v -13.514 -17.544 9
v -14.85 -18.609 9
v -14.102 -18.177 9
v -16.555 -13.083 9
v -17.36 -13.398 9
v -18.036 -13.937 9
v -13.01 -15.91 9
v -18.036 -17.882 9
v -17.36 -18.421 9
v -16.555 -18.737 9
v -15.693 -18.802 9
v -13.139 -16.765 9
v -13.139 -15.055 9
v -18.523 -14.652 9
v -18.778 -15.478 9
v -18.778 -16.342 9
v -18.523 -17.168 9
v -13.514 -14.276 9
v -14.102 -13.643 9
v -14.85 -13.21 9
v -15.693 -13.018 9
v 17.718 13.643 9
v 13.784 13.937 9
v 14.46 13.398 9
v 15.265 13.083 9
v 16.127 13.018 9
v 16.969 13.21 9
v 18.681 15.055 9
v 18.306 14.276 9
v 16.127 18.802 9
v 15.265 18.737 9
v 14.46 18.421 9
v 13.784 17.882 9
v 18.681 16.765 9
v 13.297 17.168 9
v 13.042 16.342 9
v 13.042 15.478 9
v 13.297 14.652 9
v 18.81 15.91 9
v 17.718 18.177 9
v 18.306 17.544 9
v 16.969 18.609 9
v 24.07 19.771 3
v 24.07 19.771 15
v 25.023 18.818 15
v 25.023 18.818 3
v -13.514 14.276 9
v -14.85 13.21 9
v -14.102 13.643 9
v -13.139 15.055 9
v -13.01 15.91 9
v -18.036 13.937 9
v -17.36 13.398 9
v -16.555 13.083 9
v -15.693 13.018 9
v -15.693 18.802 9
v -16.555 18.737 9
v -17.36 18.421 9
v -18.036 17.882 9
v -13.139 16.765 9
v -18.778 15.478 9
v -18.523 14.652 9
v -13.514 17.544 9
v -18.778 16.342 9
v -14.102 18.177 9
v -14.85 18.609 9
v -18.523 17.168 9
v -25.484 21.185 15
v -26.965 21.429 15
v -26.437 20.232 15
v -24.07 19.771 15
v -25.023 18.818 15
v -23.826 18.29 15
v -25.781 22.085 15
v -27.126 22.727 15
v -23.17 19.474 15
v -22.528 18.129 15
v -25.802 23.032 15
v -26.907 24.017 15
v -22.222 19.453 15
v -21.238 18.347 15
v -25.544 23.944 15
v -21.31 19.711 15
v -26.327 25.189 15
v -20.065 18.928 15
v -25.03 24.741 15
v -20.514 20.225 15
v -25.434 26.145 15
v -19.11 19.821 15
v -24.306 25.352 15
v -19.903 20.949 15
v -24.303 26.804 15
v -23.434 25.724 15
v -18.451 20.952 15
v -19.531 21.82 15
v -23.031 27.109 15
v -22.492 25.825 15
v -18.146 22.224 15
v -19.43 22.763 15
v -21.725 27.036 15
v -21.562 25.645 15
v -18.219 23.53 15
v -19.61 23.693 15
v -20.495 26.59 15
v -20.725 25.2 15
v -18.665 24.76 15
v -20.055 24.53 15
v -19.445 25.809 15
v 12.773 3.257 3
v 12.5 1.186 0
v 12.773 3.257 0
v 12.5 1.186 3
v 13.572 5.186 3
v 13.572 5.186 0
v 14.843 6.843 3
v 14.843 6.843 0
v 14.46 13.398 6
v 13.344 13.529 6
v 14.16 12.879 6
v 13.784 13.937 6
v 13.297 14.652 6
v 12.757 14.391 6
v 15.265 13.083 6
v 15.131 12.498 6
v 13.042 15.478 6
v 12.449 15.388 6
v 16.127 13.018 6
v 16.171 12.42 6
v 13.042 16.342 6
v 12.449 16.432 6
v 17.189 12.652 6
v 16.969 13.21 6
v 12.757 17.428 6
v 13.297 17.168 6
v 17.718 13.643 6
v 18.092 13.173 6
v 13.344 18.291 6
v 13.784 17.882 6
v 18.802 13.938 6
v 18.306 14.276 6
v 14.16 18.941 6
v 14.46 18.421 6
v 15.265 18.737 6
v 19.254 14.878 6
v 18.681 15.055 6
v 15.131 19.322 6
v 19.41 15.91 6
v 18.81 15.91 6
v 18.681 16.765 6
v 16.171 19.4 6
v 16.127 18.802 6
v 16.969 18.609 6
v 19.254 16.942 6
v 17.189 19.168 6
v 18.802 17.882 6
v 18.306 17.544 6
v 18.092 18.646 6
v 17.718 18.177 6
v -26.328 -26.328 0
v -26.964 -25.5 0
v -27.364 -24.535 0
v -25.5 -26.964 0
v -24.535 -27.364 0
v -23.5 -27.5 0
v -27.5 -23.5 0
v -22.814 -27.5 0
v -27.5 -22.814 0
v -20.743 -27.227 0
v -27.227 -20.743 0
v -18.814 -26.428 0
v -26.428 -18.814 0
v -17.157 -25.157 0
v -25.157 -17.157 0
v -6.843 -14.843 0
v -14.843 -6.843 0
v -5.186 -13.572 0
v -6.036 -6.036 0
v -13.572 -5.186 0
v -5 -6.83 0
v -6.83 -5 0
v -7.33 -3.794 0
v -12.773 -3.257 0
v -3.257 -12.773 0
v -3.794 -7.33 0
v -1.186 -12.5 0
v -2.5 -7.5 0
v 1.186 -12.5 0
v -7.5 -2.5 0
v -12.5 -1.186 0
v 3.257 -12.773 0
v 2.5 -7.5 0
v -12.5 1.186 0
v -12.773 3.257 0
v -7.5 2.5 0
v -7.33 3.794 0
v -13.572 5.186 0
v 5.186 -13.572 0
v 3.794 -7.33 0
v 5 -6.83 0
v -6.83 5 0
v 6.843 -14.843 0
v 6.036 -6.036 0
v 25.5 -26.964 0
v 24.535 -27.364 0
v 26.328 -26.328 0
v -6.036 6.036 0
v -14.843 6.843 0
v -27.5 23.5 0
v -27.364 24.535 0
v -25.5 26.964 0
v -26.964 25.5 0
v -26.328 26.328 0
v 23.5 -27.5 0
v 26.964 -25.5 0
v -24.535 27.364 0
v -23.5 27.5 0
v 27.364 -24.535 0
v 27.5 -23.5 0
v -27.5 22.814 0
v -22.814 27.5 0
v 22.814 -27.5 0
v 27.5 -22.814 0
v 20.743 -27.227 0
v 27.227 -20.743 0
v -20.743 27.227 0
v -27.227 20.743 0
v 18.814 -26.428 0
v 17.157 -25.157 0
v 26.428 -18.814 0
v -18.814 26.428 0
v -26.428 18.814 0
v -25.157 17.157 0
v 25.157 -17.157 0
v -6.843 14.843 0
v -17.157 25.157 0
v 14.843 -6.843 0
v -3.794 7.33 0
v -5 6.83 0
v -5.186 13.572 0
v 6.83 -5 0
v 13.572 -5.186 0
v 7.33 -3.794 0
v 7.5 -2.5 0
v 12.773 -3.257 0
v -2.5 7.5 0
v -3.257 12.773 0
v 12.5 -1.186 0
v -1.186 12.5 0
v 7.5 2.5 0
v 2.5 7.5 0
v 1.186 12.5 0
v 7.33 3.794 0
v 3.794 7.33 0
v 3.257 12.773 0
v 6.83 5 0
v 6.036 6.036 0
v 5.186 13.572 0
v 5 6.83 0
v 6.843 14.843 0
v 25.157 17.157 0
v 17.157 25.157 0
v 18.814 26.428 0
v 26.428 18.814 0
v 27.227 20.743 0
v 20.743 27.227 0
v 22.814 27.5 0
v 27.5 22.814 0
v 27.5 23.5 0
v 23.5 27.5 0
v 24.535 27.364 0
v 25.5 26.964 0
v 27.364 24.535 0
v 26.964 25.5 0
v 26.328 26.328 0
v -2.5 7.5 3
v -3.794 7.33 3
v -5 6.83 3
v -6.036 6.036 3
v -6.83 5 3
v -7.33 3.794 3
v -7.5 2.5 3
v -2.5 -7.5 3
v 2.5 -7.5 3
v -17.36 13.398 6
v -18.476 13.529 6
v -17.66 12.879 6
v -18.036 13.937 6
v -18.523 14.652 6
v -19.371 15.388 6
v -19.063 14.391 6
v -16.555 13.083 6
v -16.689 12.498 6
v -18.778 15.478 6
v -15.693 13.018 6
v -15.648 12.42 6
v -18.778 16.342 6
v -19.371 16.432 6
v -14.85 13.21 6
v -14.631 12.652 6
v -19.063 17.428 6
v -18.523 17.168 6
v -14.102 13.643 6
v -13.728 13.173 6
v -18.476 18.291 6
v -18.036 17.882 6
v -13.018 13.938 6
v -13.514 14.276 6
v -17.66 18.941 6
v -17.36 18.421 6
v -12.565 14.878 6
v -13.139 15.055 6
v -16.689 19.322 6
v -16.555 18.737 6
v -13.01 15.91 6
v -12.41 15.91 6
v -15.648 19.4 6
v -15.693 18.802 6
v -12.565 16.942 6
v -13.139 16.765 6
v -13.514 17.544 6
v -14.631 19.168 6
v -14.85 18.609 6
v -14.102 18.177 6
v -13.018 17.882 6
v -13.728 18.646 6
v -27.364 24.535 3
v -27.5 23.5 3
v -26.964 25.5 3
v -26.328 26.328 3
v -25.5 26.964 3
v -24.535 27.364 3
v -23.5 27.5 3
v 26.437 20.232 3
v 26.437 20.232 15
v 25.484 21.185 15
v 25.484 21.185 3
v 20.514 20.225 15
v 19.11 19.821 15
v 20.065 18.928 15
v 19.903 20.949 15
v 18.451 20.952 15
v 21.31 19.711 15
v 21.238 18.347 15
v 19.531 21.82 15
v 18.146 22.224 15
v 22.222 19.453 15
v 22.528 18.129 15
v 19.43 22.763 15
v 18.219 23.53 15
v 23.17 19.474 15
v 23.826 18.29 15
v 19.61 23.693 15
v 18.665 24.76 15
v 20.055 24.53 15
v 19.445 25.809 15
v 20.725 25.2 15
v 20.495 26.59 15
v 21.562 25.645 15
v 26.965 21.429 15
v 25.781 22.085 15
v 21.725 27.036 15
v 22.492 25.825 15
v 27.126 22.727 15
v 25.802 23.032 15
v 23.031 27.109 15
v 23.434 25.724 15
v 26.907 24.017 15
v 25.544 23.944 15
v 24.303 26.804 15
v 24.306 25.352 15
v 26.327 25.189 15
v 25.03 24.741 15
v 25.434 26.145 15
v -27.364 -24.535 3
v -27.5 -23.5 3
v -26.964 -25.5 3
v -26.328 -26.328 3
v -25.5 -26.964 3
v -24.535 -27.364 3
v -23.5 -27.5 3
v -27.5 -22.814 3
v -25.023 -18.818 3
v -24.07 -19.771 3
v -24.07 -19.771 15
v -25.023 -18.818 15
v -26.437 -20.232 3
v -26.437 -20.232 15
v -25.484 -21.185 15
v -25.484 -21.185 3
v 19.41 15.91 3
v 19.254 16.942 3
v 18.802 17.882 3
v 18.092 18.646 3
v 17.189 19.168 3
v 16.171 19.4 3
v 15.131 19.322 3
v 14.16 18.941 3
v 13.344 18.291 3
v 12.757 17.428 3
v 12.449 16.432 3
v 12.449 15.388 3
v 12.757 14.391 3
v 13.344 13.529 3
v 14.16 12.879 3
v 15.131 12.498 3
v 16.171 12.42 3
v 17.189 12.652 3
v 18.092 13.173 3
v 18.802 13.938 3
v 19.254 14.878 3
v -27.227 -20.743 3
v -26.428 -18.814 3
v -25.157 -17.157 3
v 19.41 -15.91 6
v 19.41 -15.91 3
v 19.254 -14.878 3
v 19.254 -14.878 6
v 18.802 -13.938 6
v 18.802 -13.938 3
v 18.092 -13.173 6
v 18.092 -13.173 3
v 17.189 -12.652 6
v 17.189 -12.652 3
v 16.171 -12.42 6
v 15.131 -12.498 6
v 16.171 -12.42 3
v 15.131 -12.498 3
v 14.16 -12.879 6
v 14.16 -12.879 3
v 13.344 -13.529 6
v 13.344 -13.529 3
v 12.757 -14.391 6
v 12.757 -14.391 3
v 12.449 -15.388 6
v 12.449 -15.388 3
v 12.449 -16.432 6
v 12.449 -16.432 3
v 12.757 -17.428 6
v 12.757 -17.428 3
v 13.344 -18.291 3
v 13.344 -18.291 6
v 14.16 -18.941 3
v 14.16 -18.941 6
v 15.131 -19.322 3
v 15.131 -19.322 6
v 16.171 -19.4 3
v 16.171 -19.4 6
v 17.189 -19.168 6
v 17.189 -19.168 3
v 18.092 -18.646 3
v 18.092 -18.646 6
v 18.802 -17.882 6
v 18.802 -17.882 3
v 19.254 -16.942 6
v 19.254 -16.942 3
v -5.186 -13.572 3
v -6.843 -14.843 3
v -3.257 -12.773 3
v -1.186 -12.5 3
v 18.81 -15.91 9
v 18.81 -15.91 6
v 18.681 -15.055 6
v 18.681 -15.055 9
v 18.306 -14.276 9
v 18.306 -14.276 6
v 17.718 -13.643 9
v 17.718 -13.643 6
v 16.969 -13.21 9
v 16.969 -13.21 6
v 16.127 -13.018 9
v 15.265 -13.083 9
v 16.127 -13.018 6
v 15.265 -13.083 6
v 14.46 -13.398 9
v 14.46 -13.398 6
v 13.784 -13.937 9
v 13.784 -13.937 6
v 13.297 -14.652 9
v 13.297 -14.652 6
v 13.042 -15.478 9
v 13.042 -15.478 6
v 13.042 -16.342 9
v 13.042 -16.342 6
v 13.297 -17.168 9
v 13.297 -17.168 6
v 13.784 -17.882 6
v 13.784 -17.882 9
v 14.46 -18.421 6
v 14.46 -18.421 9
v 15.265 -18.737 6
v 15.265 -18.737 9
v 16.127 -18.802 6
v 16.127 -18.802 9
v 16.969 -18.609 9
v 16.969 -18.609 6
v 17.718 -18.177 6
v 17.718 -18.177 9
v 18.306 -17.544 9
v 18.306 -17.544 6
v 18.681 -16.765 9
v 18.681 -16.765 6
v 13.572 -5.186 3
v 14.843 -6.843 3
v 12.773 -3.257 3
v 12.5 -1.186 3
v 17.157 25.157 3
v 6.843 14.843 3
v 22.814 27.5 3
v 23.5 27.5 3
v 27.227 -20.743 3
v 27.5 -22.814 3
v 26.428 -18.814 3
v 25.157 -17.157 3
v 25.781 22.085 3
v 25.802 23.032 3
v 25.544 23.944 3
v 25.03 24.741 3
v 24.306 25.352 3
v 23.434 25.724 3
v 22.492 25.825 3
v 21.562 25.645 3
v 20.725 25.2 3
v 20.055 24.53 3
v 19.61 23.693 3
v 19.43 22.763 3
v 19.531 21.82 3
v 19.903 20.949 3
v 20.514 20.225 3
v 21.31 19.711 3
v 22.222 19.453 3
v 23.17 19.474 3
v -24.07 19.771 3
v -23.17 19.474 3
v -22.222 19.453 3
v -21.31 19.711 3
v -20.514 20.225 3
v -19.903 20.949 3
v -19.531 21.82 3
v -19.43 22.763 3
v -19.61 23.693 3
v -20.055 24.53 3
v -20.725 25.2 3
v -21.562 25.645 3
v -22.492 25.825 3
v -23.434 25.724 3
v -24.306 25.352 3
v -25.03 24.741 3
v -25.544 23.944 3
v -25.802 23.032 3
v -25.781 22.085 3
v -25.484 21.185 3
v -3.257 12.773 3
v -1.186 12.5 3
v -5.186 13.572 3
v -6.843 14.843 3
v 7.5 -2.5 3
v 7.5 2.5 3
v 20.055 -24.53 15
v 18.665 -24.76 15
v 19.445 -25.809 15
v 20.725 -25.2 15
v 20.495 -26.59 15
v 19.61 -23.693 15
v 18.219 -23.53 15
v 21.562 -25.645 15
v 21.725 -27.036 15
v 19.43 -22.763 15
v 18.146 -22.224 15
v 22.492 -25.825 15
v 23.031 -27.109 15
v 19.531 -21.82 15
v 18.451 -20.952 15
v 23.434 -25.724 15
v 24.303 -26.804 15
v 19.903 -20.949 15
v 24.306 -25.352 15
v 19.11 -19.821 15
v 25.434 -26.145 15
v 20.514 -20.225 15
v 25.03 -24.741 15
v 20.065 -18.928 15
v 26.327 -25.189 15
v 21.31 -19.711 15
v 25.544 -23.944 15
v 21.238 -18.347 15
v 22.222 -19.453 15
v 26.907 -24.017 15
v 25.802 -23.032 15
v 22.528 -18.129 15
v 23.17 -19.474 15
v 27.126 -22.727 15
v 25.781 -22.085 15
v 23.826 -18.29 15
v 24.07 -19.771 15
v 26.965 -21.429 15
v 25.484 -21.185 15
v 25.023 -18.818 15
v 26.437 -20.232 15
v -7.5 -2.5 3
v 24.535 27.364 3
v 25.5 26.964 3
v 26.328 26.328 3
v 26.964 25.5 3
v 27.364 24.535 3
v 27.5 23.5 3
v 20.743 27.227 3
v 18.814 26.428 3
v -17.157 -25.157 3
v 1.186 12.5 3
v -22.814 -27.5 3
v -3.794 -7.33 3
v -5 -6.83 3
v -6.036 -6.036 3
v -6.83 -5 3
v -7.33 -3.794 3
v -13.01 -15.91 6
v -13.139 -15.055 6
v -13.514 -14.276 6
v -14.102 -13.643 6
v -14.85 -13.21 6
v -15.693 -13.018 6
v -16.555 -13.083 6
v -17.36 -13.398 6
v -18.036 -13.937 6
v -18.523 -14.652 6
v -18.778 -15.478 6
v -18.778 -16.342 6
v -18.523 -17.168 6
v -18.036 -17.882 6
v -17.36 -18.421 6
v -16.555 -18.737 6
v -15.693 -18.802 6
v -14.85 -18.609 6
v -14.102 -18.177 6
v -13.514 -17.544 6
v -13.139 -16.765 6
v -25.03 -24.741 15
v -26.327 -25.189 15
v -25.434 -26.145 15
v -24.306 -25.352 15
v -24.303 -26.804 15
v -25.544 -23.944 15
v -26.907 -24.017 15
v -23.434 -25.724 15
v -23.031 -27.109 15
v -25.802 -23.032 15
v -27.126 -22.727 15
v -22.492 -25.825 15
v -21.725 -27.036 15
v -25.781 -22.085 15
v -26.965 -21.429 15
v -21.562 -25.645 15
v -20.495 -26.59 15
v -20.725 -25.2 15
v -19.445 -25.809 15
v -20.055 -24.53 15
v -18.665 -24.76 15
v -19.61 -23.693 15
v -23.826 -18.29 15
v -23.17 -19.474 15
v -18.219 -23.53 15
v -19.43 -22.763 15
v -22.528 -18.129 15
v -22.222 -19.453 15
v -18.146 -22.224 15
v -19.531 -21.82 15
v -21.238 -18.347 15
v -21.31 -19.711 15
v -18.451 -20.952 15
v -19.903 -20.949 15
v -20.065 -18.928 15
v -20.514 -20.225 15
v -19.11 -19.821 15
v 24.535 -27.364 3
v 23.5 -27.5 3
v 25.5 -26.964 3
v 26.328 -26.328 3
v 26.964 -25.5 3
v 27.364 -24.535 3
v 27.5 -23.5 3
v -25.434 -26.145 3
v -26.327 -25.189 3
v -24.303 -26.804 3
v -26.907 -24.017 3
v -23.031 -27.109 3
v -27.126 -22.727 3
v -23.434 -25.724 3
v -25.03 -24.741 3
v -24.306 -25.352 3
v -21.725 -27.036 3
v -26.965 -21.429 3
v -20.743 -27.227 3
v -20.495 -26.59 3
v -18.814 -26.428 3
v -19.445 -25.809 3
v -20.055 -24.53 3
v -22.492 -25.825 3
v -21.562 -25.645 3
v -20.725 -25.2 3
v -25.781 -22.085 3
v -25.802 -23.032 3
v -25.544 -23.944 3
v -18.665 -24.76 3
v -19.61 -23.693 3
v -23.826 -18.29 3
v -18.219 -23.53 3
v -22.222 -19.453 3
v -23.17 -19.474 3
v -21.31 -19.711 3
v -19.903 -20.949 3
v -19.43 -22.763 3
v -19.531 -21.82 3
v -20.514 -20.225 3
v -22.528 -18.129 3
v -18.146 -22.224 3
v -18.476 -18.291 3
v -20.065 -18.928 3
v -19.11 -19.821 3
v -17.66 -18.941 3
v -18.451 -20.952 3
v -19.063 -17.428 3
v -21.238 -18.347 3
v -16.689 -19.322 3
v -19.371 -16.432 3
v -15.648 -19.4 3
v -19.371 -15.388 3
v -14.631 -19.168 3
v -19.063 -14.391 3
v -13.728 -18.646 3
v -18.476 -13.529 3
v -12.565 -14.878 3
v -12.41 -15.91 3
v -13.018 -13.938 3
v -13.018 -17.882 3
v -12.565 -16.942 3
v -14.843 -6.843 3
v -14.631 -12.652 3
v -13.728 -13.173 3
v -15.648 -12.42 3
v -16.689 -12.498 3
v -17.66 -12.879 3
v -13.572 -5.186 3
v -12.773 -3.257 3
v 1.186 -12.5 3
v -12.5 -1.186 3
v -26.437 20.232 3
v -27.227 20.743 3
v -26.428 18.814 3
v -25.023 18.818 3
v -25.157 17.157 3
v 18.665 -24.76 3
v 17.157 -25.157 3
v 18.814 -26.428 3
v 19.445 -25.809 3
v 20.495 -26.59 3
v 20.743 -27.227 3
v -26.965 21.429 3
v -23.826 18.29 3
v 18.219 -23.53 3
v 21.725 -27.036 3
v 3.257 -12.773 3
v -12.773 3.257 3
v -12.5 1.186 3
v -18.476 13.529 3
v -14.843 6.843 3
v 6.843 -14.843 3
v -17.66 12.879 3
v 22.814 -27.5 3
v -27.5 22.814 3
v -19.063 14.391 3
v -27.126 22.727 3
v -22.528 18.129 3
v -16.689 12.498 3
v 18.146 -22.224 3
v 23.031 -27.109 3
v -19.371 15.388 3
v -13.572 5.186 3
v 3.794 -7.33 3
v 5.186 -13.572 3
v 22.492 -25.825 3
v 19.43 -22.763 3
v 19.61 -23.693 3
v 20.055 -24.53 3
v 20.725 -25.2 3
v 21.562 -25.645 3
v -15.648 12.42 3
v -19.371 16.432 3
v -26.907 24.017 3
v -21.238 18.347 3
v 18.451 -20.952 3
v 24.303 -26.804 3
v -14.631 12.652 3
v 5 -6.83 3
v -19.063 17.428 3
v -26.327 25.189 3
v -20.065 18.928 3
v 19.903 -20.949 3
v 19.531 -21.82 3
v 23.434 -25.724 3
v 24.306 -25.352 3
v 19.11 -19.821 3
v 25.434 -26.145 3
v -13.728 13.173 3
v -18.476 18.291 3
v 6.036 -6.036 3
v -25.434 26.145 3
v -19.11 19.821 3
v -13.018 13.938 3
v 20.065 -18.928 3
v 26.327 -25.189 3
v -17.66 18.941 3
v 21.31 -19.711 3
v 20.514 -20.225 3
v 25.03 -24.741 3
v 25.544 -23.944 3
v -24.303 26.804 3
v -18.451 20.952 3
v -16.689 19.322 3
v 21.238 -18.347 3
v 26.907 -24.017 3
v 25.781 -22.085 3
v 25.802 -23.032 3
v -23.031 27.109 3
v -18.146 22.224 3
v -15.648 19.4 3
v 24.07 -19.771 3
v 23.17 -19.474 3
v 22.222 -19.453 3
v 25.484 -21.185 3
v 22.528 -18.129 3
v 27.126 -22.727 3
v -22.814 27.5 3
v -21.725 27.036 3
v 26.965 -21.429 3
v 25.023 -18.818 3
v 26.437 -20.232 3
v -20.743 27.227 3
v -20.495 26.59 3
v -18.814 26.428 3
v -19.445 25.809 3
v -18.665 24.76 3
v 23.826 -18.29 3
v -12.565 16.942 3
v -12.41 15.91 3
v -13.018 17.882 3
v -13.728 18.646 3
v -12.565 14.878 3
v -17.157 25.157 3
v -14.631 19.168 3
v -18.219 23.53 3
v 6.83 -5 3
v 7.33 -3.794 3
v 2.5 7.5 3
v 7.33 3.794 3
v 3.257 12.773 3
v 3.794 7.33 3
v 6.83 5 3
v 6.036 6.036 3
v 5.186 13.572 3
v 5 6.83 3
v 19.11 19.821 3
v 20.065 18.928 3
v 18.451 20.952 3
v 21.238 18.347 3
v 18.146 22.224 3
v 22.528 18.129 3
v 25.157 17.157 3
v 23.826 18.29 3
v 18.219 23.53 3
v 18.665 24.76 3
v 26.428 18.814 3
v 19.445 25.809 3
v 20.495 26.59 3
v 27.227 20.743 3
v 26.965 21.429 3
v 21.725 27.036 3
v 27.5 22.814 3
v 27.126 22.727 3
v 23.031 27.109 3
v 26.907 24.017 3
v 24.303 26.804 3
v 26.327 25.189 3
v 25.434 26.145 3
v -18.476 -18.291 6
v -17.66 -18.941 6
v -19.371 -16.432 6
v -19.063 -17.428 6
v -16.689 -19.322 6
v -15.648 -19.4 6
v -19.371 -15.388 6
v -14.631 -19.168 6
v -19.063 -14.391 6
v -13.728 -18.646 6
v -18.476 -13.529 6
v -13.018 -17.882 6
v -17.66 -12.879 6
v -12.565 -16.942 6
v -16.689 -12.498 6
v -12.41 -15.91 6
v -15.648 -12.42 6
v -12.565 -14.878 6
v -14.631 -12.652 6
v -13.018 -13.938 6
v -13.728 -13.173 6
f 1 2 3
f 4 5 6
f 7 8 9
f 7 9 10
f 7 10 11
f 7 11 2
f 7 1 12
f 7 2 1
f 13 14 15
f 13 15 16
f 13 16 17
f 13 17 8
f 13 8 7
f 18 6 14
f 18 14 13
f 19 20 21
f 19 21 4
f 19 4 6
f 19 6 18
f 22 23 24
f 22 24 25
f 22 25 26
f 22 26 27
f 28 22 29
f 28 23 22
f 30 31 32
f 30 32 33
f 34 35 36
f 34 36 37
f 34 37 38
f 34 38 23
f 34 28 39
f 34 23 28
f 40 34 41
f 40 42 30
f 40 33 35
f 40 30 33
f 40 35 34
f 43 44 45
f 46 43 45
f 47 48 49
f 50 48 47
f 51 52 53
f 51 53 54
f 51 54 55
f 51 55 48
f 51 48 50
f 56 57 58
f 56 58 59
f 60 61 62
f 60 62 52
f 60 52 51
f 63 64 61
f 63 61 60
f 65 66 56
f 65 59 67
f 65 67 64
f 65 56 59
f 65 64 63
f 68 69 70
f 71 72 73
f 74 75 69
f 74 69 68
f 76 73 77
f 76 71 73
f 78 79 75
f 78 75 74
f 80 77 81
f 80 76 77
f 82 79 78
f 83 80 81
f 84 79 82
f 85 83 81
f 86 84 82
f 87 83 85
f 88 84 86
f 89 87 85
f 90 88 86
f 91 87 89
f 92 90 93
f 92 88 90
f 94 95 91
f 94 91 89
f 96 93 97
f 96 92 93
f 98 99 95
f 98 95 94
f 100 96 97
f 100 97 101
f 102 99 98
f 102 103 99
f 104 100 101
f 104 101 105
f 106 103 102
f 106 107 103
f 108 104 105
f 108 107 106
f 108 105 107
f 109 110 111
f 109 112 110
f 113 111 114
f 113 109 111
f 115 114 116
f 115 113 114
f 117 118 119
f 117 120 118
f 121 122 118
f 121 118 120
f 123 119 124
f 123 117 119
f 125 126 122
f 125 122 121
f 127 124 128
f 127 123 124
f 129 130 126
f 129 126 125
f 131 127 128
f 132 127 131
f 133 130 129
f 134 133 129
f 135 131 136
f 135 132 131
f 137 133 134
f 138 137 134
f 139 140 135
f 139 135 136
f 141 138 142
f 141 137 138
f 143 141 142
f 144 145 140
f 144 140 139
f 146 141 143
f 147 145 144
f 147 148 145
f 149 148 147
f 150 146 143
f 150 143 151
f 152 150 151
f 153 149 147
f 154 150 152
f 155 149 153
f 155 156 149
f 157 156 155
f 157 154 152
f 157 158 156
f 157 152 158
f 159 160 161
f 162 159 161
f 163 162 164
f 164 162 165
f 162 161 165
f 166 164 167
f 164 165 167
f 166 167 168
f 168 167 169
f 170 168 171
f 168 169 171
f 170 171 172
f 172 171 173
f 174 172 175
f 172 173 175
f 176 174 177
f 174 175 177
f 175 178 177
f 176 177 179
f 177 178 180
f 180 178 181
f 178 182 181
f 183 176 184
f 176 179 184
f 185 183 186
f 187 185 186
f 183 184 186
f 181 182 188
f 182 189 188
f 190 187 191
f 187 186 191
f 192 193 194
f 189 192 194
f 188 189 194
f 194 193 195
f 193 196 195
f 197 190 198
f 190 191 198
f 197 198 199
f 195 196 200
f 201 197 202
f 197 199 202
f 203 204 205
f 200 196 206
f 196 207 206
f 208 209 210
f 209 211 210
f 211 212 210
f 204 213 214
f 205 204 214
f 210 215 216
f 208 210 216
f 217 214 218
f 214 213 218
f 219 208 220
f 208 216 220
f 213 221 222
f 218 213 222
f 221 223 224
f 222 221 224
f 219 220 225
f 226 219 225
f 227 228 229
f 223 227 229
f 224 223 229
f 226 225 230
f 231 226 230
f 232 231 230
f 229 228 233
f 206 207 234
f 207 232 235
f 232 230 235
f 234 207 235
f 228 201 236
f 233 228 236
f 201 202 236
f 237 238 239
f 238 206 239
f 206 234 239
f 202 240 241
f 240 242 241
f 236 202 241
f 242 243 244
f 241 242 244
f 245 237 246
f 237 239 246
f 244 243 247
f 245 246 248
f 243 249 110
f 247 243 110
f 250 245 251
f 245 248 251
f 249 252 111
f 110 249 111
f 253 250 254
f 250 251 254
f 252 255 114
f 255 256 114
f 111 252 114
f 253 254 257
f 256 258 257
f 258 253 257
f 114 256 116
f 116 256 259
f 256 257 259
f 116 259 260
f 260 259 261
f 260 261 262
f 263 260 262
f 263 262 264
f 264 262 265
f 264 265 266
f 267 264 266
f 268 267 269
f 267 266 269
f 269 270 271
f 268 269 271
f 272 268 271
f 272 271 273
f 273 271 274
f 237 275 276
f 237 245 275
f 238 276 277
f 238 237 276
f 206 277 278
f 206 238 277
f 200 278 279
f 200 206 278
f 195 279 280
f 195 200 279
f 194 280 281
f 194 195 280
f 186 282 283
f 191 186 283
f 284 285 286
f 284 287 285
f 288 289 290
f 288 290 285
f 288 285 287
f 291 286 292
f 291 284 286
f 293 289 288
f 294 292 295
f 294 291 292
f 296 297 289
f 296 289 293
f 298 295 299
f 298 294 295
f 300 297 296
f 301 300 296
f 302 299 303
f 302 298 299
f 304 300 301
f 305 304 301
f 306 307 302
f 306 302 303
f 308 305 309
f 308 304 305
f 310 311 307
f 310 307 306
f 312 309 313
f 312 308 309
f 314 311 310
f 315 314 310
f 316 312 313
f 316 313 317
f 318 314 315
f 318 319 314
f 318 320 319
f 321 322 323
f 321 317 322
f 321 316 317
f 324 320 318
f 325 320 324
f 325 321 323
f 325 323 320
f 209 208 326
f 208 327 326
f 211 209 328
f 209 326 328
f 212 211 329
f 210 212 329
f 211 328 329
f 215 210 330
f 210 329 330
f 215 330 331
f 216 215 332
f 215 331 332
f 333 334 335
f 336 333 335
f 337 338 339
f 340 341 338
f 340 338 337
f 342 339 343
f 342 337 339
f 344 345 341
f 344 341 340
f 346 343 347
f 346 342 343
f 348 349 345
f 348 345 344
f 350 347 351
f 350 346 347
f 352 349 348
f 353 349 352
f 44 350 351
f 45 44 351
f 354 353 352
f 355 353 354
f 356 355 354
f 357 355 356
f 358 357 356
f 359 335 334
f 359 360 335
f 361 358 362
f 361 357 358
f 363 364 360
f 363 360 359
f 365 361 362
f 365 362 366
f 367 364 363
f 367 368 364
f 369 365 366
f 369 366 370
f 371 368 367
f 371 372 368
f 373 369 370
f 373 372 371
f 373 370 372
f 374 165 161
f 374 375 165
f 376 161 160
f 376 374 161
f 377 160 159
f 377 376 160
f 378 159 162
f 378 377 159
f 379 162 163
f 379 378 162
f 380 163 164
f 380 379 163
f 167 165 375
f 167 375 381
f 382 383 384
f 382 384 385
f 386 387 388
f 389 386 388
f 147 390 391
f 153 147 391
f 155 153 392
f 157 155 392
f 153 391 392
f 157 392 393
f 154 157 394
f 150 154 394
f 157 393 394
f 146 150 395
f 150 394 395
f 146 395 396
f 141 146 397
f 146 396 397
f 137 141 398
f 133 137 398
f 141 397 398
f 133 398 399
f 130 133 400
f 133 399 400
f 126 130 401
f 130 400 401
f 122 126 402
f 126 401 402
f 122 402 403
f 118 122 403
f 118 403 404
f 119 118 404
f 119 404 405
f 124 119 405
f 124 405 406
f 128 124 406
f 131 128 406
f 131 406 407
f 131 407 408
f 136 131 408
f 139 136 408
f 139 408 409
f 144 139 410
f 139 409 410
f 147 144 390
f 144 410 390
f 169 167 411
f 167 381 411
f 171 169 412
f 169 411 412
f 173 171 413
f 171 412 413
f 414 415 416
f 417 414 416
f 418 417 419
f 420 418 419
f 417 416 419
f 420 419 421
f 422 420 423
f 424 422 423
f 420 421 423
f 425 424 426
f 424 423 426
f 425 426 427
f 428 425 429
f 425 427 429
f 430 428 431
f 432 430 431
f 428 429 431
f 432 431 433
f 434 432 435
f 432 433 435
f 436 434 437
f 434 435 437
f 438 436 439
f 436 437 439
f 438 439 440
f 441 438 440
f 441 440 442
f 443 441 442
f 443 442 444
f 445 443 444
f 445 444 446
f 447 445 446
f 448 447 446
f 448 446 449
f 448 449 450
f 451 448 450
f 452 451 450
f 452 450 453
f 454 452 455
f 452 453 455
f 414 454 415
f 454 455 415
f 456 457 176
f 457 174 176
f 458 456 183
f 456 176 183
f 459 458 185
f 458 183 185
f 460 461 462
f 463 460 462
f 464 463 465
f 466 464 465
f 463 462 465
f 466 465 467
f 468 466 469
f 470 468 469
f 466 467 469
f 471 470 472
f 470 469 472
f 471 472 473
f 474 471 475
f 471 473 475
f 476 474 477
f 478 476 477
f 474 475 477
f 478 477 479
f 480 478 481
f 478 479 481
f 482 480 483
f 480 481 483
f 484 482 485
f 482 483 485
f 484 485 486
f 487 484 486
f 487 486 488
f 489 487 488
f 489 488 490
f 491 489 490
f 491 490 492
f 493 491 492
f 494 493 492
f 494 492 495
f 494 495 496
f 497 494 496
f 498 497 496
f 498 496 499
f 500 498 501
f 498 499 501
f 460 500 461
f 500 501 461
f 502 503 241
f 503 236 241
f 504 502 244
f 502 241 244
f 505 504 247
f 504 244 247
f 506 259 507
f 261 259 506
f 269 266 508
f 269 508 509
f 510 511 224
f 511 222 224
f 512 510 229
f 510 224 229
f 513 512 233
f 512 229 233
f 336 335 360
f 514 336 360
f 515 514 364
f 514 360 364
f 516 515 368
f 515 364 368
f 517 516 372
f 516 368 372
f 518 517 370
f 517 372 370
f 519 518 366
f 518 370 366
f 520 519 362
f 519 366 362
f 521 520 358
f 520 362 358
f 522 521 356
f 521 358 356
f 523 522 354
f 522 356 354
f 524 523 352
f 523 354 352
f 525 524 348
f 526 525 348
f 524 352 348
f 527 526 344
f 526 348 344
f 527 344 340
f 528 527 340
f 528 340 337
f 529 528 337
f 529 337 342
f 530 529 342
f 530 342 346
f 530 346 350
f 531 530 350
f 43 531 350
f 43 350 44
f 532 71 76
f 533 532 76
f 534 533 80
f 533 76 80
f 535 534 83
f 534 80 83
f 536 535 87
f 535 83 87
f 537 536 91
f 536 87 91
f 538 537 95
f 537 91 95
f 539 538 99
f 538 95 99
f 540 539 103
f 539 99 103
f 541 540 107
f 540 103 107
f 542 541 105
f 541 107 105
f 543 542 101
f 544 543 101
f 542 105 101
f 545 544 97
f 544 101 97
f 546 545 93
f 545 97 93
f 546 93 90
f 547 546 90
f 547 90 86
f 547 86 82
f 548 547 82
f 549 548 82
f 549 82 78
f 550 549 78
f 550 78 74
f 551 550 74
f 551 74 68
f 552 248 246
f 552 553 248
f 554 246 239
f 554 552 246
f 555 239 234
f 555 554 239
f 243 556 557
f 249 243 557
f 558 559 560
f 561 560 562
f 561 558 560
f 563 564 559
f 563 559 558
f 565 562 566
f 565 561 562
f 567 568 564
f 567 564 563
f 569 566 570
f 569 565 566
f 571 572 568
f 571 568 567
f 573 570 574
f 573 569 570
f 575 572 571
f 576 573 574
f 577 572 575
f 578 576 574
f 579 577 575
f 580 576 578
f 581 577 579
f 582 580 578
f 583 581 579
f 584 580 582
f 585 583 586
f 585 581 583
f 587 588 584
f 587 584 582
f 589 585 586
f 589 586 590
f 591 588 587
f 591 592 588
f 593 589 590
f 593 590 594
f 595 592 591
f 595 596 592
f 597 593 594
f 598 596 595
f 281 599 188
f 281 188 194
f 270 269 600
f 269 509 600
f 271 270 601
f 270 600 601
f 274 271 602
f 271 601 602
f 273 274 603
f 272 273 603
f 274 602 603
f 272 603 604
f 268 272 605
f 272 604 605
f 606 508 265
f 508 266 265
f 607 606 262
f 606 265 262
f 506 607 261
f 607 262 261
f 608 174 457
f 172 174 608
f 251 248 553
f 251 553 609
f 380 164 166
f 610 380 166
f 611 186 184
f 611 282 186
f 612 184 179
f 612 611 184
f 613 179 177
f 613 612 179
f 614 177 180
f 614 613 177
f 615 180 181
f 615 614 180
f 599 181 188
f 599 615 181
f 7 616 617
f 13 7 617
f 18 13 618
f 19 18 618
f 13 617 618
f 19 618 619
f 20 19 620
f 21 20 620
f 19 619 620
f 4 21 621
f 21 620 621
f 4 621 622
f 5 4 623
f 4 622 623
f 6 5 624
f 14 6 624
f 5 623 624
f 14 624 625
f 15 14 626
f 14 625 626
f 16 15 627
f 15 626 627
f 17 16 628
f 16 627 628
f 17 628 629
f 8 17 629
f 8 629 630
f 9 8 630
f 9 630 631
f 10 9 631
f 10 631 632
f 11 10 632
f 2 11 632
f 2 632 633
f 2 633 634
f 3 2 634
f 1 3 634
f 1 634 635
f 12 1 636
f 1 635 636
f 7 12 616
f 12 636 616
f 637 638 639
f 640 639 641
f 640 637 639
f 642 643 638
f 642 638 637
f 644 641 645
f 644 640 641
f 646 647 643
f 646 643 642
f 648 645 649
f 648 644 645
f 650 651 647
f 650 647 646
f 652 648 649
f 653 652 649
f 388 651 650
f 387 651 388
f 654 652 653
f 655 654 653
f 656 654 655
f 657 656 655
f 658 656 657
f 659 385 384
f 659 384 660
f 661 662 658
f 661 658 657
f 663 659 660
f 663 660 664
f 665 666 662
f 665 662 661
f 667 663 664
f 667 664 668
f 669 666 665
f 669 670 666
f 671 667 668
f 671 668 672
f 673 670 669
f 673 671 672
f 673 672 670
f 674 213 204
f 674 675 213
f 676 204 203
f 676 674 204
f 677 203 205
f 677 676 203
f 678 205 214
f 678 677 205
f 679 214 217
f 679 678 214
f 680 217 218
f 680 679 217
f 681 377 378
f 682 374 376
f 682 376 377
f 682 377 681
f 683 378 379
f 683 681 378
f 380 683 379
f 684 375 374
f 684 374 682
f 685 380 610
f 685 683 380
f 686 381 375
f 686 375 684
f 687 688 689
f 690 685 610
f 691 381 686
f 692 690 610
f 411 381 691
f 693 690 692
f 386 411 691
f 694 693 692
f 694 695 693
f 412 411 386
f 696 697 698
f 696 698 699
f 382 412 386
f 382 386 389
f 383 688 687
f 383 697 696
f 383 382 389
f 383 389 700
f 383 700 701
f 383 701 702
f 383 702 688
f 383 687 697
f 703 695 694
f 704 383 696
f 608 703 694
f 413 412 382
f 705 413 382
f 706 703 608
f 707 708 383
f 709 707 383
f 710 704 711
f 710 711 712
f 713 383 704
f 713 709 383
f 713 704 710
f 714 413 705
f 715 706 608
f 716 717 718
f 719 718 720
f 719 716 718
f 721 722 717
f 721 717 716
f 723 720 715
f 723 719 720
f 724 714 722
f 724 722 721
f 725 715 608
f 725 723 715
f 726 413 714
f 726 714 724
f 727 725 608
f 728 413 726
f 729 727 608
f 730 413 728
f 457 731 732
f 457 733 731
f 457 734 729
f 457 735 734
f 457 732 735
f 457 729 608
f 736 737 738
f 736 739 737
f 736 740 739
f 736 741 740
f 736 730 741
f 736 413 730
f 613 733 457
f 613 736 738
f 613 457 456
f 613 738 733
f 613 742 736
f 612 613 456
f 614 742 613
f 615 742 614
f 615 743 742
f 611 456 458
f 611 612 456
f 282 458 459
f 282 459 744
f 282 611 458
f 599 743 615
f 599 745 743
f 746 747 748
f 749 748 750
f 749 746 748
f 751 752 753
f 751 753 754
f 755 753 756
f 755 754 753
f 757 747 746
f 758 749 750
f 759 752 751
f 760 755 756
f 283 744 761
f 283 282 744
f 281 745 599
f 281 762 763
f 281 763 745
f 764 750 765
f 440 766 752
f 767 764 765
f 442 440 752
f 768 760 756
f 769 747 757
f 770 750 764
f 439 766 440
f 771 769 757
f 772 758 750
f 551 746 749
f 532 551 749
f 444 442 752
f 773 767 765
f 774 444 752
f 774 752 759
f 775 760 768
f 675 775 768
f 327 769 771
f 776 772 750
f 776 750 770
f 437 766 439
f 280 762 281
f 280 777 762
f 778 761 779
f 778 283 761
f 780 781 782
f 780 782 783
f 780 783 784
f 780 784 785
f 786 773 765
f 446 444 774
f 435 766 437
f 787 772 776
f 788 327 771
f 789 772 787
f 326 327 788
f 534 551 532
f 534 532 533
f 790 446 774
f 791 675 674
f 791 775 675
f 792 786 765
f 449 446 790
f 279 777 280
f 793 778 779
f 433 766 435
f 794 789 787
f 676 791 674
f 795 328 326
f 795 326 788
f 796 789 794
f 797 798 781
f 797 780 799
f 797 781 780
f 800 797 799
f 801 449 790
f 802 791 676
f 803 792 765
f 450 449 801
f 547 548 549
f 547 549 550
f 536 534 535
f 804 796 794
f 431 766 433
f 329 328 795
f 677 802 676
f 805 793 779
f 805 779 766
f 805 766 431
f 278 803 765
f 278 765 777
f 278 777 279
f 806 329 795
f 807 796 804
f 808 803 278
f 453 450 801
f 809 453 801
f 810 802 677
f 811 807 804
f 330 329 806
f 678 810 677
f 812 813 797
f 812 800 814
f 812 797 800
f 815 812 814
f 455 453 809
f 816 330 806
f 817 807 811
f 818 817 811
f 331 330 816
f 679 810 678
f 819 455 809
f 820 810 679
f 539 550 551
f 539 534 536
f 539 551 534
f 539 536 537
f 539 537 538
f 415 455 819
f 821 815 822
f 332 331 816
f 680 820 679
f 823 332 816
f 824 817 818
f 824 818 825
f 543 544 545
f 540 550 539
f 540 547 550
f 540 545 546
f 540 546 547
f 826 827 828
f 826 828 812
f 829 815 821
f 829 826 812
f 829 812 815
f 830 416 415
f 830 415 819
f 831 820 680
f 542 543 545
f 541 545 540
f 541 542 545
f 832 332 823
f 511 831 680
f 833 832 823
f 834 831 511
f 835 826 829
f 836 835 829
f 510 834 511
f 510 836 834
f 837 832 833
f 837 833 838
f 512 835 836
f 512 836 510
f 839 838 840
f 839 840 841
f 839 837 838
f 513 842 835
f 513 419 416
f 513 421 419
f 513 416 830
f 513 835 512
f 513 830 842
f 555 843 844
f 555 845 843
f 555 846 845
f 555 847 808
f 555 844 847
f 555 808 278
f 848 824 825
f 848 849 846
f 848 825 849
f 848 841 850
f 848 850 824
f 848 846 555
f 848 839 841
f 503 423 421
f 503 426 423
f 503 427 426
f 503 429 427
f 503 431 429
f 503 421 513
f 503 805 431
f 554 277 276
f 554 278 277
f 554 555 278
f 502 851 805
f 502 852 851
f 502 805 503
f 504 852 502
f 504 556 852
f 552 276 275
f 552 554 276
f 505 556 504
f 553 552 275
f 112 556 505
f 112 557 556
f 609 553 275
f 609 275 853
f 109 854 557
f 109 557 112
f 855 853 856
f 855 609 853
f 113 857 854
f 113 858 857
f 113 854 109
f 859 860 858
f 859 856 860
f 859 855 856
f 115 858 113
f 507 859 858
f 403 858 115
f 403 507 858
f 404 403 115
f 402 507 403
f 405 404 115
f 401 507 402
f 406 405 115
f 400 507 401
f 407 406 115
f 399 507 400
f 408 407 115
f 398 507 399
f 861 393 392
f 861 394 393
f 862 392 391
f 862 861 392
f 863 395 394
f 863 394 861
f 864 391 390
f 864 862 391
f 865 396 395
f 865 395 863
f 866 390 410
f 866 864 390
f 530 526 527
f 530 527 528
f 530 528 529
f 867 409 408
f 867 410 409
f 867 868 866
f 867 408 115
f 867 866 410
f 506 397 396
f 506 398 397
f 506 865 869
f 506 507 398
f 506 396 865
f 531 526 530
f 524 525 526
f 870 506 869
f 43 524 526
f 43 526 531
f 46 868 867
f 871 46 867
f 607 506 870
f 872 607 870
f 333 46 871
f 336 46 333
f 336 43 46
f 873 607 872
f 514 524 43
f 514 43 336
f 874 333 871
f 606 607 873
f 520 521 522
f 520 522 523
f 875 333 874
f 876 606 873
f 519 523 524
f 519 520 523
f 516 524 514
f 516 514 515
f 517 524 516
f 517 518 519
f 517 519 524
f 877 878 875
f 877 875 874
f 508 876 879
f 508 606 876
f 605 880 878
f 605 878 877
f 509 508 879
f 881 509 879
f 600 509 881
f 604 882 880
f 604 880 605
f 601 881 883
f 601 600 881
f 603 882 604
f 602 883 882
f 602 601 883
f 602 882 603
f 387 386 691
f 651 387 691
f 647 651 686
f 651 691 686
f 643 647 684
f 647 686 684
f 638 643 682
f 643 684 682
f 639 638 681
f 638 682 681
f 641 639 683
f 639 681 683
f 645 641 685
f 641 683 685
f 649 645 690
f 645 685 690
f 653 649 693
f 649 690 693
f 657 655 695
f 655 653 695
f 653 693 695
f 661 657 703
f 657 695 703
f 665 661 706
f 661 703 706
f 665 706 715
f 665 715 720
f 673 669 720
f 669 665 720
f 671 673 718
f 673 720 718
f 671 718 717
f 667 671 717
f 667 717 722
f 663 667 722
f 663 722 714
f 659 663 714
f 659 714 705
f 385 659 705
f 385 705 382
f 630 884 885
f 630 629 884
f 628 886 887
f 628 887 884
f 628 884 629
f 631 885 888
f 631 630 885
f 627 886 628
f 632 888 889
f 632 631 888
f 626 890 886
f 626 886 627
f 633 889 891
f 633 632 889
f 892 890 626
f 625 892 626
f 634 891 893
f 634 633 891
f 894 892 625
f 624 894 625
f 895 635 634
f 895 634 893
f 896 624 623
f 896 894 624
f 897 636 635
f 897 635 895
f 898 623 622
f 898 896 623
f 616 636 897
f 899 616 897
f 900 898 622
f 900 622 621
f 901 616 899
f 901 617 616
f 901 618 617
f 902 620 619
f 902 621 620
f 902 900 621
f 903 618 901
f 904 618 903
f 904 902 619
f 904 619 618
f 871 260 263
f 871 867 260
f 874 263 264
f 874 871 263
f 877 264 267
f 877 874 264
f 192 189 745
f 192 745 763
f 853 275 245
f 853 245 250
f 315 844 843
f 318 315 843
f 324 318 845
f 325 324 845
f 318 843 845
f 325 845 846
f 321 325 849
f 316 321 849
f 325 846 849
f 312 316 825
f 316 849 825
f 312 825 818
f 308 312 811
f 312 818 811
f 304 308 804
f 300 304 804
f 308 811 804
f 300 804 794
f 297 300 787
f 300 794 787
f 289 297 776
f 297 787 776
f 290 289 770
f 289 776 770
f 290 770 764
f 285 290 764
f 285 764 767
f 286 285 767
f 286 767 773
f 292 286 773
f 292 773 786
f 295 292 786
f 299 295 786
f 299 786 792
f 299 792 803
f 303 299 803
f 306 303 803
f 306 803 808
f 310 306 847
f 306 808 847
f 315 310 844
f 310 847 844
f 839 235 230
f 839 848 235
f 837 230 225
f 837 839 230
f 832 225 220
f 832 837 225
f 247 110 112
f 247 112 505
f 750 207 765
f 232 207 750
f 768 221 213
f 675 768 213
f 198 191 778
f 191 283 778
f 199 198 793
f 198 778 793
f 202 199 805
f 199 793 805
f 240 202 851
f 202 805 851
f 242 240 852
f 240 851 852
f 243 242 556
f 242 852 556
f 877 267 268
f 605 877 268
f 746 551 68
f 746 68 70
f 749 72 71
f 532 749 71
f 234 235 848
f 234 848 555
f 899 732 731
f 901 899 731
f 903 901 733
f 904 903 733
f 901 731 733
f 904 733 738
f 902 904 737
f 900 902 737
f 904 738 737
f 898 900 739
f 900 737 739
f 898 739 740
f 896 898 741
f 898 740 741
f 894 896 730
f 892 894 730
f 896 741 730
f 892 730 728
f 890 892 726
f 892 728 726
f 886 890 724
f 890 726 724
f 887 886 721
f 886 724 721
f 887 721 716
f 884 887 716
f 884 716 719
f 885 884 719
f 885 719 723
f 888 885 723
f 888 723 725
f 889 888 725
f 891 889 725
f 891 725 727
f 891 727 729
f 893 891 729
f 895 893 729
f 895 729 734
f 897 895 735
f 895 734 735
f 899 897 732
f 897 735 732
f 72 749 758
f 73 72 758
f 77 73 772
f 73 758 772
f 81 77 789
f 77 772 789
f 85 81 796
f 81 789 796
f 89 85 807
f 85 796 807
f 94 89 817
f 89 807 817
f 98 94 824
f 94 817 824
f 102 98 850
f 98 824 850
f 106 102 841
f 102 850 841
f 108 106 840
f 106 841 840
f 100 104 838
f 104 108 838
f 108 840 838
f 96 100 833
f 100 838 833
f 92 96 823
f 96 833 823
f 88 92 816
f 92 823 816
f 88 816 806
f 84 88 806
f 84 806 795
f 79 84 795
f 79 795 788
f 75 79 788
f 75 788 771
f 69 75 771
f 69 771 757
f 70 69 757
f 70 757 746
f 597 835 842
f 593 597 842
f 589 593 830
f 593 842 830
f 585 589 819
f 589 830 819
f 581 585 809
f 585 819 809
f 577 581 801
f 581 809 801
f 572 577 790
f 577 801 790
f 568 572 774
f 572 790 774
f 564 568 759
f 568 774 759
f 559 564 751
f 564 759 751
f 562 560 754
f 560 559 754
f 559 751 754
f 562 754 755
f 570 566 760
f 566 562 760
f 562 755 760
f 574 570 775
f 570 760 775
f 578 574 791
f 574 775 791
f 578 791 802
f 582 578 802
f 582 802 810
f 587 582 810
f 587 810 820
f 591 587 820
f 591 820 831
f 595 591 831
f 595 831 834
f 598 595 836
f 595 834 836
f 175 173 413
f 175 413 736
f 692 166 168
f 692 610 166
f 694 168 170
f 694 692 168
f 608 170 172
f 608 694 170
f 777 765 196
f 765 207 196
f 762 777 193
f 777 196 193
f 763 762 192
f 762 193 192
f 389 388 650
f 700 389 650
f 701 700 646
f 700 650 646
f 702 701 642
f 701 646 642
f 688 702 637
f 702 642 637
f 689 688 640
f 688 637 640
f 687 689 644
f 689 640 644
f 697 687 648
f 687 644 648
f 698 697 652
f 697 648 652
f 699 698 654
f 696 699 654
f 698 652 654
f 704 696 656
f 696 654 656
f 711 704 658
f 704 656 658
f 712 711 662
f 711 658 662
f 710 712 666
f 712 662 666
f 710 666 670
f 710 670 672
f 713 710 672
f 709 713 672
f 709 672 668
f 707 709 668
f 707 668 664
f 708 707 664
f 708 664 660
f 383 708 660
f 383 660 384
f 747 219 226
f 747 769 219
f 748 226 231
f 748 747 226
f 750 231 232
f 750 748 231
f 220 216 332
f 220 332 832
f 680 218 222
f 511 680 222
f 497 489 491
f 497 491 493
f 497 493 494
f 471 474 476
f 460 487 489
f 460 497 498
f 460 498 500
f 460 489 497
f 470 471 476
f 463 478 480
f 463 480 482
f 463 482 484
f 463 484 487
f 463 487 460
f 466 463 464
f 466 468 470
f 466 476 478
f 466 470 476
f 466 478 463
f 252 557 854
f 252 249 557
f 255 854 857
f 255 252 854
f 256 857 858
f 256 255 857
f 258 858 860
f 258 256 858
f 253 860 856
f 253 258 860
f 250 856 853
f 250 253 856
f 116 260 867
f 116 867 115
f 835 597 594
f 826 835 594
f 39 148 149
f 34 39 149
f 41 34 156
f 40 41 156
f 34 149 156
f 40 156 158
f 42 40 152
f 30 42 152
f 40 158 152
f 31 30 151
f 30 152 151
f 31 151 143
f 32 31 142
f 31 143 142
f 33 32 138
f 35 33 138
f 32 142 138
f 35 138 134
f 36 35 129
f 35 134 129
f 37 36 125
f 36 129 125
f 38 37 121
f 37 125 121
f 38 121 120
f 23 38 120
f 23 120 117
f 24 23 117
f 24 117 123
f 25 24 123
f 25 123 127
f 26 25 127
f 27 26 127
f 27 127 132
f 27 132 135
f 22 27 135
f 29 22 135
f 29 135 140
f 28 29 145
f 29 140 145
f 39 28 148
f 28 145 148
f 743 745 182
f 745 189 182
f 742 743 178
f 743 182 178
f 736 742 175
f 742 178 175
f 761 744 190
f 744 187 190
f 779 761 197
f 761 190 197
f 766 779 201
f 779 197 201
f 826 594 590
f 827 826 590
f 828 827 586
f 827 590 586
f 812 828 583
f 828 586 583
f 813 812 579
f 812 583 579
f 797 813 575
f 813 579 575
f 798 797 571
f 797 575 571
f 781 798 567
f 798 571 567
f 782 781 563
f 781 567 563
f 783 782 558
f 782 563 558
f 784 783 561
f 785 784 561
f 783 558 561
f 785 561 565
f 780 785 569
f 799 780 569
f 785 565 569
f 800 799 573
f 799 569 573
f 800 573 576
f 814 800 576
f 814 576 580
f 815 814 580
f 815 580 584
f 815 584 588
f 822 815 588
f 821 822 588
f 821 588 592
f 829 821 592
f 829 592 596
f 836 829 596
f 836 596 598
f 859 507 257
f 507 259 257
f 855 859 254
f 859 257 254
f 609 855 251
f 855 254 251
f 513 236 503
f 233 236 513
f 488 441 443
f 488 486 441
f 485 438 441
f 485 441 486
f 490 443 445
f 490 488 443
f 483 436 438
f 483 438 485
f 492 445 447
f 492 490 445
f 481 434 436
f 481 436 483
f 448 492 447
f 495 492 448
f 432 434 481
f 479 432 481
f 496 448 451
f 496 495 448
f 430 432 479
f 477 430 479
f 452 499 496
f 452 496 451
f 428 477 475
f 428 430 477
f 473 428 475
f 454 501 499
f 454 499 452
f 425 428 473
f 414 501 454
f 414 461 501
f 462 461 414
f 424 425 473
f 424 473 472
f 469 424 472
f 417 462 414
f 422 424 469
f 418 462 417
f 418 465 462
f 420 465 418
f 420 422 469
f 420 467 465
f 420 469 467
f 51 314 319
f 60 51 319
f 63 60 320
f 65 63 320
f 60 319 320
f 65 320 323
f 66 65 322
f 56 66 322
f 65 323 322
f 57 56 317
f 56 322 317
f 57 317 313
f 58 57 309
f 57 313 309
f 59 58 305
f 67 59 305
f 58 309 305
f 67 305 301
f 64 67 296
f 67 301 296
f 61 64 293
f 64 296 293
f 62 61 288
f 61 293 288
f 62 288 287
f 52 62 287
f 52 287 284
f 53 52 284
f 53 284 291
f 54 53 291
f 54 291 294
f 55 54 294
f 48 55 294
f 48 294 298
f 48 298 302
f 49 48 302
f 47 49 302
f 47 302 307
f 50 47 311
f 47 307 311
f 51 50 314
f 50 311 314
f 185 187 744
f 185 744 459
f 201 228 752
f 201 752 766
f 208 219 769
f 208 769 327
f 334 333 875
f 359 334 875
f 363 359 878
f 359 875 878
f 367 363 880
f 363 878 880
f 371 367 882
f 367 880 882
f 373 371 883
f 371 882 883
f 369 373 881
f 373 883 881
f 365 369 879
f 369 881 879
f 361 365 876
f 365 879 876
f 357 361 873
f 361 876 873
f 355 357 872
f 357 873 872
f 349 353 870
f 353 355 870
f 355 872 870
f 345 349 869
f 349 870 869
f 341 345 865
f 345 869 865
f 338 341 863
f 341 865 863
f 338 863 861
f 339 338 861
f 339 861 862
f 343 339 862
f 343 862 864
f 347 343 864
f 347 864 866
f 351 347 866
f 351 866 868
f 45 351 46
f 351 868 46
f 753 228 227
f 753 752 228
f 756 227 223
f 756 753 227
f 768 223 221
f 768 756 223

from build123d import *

# Parameters (mm, degrees)
F0_W      = 55
F0_H      = 55
F1_DEPTH  = 3
F2_R      = 3.5
F3_DEPTH  = 3
F4_R      = 2.9
F5_DEPTH  = 3
F6_R      = 4.5
F7_DEPTH  = 12
F8_R      = 3.2
F9_DEPTH  = 12
F10_R     = 4
F11_W     = 15
F11_H     = 15
F12_DEPTH = 20
F14_DEPTH = 25
F15_R     = 8
F16_R     = 5


with BuildPart() as f1:
    # F0 (on Top) → F1 (new body)
    with BuildSketch(Plane.XY):
        Rectangle(F0_W, F0_H)
    extrude(amount=F1_DEPTH)

    # F2 (on face) → F3 (join)
    with BuildSketch(Plane.XY.offset(3)):
        with Locations((-15.9099025767, 15.9099025767)):
            Circle(F2_R)
        with Locations((15.9099025767, 15.9099025767)):
            Circle(F2_R)
        with Locations((-15.9099025767, -15.9099025767)):
            Circle(F2_R)
        with Locations((15.9099025767, -15.9099025767)):
            Circle(F2_R)
    extrude(amount=F3_DEPTH)

    # F4 (on face) → F5 (join)
    with BuildSketch(Plane.XY.offset(6)):
        with Locations((-15.9099025767, 15.9099025767)):
            Circle(F4_R)
        with Locations((15.9099025767, 15.9099025767)):
            Circle(F4_R)
        with Locations((-15.9099025767, -15.9099025767)):
            Circle(F4_R)
        with Locations((15.9099025767, -15.9099025767)):
            Circle(F4_R)
    extrude(amount=F5_DEPTH)

    # F6 (on face) → F7 (join)
    with BuildSketch(Plane.XY.offset(3)):
        with Locations((-22.627416998, 22.627416998)):
            Circle(F6_R)
        with Locations((22.627416998, 22.627416998)):
            Circle(F6_R)
        with Locations((22.627416998, -22.627416998)):
            Circle(F6_R)
        with Locations((-22.627416998, -22.627416998)):
            Circle(F6_R)
    extrude(amount=F7_DEPTH)

    # F8 (on face) → F9 (cut)
    with BuildSketch(Plane.XY.offset(15)):
        with Locations((-22.627416998, -22.627416998)):
            Circle(F8_R)
        with Locations((22.627416998, -22.627416998)):
            Circle(F8_R)
        with Locations((-22.627416998, 22.627416998)):
            Circle(F8_R)
        with Locations((22.627416998, 22.627416998)):
            Circle(F8_R)
    extrude(amount=-F9_DEPTH, mode=Mode.SUBTRACT)

    # F10
    f10_edges = [f1.edges().sort_by_distance(p)[0] for p in [
        (27.5, -27.5, 1.5),
        (-27.5, -27.5, 1.5),
        (-27.5, 27.5, 1.5),
        (27.5, 27.5, 1.5),
    ]]
    fillet(f10_edges, radius=F10_R)

    # F11 (on face) → F12 (cut, symmetric)
    with BuildSketch(Plane.XY.offset(3)):
        Polygon((-12.5, 4.5), (-27.5, 19.5), (-27.5, -19.5), (-12.5, -4.5), align=None)
        Polygon((19.5, 27.5), (-19.5, 27.5), (-4.5, 12.5), (4.5, 12.5), align=None)
        Polygon((27.5, -19.5), (27.5, 19.5), (12.5, 4.5), (12.5, -4.5), align=None)
        Polygon((-4.5, -12.5), (-19.5, -27.5), (19.5, -27.5), (4.5, -12.5), align=None)
        Rectangle(F11_W, F11_H)
    extrude(amount=F12_DEPTH, both=True, mode=Mode.SUBTRACT)

    # F13 (on face) → F14 (cut)
    with BuildSketch(Plane.XY.offset(3)):
        Polygon((-26.8456843913, 19.823363167), (-25.4314708289, 18.4091496047), (-22.6030437041, 21.2375767294), (-24.0172572665, 22.6517902918), align=None)
        Polygon((22.6030437041, 21.2375767294), (25.4314708289, 18.4091496047), (26.8456843913, 19.823363167), (24.0172572665, 22.6517902918), align=None)
        Polygon((-25.4314708289, -18.4091496047), (-26.8456843913, -19.823363167), (-24.0172572665, -22.6517902918), (-22.6030437041, -21.2375767294), align=None)
        Polygon((26.8456843913, -19.823363167), (25.4314708289, -18.4091496047), (22.6030437041, -21.2375767294), (24.0172572665, -22.6517902918), align=None)
    extrude(amount=F14_DEPTH, mode=Mode.SUBTRACT)

    # F15
    f15_edges = [f1.edges().sort_by_distance(p)[0] for p in [
        (19.5, -27.5, 1.5),
        (4.5, -12.5, 1.5),
        (-4.5, -12.5, 1.5),
        (-19.5, -27.5, 1.5),
        (-27.5, -19.5, 1.5),
        (-12.5, -4.5, 1.5),
        (-12.5, 4.5, 1.5),
        (-27.5, 19.5, 1.5),
        (-19.5, 27.5, 1.5),
        (-4.5, 12.5, 1.5),
        (4.5, 12.5, 1.5),
        (19.5, 27.5, 1.5),
        (12.5, -4.5, 1.5),
        (12.5, 4.5, 1.5),
        (27.5, 19.5, 1.5),
        (27.5, -19.5, 1.5),
    ]]
    fillet(f15_edges, radius=F15_R)

    # F16
    f16_edges = [f1.edges().sort_by_distance(p)[0] for p in [
        (-7.5, 7.5, 1.5),
        (7.5, 7.5, 1.5),
        (7.5, -7.5, 1.5),
        (-7.5, -7.5, 1.5),
    ]]
    fillet(f16_edges, radius=F16_R)


solid = f1.part
